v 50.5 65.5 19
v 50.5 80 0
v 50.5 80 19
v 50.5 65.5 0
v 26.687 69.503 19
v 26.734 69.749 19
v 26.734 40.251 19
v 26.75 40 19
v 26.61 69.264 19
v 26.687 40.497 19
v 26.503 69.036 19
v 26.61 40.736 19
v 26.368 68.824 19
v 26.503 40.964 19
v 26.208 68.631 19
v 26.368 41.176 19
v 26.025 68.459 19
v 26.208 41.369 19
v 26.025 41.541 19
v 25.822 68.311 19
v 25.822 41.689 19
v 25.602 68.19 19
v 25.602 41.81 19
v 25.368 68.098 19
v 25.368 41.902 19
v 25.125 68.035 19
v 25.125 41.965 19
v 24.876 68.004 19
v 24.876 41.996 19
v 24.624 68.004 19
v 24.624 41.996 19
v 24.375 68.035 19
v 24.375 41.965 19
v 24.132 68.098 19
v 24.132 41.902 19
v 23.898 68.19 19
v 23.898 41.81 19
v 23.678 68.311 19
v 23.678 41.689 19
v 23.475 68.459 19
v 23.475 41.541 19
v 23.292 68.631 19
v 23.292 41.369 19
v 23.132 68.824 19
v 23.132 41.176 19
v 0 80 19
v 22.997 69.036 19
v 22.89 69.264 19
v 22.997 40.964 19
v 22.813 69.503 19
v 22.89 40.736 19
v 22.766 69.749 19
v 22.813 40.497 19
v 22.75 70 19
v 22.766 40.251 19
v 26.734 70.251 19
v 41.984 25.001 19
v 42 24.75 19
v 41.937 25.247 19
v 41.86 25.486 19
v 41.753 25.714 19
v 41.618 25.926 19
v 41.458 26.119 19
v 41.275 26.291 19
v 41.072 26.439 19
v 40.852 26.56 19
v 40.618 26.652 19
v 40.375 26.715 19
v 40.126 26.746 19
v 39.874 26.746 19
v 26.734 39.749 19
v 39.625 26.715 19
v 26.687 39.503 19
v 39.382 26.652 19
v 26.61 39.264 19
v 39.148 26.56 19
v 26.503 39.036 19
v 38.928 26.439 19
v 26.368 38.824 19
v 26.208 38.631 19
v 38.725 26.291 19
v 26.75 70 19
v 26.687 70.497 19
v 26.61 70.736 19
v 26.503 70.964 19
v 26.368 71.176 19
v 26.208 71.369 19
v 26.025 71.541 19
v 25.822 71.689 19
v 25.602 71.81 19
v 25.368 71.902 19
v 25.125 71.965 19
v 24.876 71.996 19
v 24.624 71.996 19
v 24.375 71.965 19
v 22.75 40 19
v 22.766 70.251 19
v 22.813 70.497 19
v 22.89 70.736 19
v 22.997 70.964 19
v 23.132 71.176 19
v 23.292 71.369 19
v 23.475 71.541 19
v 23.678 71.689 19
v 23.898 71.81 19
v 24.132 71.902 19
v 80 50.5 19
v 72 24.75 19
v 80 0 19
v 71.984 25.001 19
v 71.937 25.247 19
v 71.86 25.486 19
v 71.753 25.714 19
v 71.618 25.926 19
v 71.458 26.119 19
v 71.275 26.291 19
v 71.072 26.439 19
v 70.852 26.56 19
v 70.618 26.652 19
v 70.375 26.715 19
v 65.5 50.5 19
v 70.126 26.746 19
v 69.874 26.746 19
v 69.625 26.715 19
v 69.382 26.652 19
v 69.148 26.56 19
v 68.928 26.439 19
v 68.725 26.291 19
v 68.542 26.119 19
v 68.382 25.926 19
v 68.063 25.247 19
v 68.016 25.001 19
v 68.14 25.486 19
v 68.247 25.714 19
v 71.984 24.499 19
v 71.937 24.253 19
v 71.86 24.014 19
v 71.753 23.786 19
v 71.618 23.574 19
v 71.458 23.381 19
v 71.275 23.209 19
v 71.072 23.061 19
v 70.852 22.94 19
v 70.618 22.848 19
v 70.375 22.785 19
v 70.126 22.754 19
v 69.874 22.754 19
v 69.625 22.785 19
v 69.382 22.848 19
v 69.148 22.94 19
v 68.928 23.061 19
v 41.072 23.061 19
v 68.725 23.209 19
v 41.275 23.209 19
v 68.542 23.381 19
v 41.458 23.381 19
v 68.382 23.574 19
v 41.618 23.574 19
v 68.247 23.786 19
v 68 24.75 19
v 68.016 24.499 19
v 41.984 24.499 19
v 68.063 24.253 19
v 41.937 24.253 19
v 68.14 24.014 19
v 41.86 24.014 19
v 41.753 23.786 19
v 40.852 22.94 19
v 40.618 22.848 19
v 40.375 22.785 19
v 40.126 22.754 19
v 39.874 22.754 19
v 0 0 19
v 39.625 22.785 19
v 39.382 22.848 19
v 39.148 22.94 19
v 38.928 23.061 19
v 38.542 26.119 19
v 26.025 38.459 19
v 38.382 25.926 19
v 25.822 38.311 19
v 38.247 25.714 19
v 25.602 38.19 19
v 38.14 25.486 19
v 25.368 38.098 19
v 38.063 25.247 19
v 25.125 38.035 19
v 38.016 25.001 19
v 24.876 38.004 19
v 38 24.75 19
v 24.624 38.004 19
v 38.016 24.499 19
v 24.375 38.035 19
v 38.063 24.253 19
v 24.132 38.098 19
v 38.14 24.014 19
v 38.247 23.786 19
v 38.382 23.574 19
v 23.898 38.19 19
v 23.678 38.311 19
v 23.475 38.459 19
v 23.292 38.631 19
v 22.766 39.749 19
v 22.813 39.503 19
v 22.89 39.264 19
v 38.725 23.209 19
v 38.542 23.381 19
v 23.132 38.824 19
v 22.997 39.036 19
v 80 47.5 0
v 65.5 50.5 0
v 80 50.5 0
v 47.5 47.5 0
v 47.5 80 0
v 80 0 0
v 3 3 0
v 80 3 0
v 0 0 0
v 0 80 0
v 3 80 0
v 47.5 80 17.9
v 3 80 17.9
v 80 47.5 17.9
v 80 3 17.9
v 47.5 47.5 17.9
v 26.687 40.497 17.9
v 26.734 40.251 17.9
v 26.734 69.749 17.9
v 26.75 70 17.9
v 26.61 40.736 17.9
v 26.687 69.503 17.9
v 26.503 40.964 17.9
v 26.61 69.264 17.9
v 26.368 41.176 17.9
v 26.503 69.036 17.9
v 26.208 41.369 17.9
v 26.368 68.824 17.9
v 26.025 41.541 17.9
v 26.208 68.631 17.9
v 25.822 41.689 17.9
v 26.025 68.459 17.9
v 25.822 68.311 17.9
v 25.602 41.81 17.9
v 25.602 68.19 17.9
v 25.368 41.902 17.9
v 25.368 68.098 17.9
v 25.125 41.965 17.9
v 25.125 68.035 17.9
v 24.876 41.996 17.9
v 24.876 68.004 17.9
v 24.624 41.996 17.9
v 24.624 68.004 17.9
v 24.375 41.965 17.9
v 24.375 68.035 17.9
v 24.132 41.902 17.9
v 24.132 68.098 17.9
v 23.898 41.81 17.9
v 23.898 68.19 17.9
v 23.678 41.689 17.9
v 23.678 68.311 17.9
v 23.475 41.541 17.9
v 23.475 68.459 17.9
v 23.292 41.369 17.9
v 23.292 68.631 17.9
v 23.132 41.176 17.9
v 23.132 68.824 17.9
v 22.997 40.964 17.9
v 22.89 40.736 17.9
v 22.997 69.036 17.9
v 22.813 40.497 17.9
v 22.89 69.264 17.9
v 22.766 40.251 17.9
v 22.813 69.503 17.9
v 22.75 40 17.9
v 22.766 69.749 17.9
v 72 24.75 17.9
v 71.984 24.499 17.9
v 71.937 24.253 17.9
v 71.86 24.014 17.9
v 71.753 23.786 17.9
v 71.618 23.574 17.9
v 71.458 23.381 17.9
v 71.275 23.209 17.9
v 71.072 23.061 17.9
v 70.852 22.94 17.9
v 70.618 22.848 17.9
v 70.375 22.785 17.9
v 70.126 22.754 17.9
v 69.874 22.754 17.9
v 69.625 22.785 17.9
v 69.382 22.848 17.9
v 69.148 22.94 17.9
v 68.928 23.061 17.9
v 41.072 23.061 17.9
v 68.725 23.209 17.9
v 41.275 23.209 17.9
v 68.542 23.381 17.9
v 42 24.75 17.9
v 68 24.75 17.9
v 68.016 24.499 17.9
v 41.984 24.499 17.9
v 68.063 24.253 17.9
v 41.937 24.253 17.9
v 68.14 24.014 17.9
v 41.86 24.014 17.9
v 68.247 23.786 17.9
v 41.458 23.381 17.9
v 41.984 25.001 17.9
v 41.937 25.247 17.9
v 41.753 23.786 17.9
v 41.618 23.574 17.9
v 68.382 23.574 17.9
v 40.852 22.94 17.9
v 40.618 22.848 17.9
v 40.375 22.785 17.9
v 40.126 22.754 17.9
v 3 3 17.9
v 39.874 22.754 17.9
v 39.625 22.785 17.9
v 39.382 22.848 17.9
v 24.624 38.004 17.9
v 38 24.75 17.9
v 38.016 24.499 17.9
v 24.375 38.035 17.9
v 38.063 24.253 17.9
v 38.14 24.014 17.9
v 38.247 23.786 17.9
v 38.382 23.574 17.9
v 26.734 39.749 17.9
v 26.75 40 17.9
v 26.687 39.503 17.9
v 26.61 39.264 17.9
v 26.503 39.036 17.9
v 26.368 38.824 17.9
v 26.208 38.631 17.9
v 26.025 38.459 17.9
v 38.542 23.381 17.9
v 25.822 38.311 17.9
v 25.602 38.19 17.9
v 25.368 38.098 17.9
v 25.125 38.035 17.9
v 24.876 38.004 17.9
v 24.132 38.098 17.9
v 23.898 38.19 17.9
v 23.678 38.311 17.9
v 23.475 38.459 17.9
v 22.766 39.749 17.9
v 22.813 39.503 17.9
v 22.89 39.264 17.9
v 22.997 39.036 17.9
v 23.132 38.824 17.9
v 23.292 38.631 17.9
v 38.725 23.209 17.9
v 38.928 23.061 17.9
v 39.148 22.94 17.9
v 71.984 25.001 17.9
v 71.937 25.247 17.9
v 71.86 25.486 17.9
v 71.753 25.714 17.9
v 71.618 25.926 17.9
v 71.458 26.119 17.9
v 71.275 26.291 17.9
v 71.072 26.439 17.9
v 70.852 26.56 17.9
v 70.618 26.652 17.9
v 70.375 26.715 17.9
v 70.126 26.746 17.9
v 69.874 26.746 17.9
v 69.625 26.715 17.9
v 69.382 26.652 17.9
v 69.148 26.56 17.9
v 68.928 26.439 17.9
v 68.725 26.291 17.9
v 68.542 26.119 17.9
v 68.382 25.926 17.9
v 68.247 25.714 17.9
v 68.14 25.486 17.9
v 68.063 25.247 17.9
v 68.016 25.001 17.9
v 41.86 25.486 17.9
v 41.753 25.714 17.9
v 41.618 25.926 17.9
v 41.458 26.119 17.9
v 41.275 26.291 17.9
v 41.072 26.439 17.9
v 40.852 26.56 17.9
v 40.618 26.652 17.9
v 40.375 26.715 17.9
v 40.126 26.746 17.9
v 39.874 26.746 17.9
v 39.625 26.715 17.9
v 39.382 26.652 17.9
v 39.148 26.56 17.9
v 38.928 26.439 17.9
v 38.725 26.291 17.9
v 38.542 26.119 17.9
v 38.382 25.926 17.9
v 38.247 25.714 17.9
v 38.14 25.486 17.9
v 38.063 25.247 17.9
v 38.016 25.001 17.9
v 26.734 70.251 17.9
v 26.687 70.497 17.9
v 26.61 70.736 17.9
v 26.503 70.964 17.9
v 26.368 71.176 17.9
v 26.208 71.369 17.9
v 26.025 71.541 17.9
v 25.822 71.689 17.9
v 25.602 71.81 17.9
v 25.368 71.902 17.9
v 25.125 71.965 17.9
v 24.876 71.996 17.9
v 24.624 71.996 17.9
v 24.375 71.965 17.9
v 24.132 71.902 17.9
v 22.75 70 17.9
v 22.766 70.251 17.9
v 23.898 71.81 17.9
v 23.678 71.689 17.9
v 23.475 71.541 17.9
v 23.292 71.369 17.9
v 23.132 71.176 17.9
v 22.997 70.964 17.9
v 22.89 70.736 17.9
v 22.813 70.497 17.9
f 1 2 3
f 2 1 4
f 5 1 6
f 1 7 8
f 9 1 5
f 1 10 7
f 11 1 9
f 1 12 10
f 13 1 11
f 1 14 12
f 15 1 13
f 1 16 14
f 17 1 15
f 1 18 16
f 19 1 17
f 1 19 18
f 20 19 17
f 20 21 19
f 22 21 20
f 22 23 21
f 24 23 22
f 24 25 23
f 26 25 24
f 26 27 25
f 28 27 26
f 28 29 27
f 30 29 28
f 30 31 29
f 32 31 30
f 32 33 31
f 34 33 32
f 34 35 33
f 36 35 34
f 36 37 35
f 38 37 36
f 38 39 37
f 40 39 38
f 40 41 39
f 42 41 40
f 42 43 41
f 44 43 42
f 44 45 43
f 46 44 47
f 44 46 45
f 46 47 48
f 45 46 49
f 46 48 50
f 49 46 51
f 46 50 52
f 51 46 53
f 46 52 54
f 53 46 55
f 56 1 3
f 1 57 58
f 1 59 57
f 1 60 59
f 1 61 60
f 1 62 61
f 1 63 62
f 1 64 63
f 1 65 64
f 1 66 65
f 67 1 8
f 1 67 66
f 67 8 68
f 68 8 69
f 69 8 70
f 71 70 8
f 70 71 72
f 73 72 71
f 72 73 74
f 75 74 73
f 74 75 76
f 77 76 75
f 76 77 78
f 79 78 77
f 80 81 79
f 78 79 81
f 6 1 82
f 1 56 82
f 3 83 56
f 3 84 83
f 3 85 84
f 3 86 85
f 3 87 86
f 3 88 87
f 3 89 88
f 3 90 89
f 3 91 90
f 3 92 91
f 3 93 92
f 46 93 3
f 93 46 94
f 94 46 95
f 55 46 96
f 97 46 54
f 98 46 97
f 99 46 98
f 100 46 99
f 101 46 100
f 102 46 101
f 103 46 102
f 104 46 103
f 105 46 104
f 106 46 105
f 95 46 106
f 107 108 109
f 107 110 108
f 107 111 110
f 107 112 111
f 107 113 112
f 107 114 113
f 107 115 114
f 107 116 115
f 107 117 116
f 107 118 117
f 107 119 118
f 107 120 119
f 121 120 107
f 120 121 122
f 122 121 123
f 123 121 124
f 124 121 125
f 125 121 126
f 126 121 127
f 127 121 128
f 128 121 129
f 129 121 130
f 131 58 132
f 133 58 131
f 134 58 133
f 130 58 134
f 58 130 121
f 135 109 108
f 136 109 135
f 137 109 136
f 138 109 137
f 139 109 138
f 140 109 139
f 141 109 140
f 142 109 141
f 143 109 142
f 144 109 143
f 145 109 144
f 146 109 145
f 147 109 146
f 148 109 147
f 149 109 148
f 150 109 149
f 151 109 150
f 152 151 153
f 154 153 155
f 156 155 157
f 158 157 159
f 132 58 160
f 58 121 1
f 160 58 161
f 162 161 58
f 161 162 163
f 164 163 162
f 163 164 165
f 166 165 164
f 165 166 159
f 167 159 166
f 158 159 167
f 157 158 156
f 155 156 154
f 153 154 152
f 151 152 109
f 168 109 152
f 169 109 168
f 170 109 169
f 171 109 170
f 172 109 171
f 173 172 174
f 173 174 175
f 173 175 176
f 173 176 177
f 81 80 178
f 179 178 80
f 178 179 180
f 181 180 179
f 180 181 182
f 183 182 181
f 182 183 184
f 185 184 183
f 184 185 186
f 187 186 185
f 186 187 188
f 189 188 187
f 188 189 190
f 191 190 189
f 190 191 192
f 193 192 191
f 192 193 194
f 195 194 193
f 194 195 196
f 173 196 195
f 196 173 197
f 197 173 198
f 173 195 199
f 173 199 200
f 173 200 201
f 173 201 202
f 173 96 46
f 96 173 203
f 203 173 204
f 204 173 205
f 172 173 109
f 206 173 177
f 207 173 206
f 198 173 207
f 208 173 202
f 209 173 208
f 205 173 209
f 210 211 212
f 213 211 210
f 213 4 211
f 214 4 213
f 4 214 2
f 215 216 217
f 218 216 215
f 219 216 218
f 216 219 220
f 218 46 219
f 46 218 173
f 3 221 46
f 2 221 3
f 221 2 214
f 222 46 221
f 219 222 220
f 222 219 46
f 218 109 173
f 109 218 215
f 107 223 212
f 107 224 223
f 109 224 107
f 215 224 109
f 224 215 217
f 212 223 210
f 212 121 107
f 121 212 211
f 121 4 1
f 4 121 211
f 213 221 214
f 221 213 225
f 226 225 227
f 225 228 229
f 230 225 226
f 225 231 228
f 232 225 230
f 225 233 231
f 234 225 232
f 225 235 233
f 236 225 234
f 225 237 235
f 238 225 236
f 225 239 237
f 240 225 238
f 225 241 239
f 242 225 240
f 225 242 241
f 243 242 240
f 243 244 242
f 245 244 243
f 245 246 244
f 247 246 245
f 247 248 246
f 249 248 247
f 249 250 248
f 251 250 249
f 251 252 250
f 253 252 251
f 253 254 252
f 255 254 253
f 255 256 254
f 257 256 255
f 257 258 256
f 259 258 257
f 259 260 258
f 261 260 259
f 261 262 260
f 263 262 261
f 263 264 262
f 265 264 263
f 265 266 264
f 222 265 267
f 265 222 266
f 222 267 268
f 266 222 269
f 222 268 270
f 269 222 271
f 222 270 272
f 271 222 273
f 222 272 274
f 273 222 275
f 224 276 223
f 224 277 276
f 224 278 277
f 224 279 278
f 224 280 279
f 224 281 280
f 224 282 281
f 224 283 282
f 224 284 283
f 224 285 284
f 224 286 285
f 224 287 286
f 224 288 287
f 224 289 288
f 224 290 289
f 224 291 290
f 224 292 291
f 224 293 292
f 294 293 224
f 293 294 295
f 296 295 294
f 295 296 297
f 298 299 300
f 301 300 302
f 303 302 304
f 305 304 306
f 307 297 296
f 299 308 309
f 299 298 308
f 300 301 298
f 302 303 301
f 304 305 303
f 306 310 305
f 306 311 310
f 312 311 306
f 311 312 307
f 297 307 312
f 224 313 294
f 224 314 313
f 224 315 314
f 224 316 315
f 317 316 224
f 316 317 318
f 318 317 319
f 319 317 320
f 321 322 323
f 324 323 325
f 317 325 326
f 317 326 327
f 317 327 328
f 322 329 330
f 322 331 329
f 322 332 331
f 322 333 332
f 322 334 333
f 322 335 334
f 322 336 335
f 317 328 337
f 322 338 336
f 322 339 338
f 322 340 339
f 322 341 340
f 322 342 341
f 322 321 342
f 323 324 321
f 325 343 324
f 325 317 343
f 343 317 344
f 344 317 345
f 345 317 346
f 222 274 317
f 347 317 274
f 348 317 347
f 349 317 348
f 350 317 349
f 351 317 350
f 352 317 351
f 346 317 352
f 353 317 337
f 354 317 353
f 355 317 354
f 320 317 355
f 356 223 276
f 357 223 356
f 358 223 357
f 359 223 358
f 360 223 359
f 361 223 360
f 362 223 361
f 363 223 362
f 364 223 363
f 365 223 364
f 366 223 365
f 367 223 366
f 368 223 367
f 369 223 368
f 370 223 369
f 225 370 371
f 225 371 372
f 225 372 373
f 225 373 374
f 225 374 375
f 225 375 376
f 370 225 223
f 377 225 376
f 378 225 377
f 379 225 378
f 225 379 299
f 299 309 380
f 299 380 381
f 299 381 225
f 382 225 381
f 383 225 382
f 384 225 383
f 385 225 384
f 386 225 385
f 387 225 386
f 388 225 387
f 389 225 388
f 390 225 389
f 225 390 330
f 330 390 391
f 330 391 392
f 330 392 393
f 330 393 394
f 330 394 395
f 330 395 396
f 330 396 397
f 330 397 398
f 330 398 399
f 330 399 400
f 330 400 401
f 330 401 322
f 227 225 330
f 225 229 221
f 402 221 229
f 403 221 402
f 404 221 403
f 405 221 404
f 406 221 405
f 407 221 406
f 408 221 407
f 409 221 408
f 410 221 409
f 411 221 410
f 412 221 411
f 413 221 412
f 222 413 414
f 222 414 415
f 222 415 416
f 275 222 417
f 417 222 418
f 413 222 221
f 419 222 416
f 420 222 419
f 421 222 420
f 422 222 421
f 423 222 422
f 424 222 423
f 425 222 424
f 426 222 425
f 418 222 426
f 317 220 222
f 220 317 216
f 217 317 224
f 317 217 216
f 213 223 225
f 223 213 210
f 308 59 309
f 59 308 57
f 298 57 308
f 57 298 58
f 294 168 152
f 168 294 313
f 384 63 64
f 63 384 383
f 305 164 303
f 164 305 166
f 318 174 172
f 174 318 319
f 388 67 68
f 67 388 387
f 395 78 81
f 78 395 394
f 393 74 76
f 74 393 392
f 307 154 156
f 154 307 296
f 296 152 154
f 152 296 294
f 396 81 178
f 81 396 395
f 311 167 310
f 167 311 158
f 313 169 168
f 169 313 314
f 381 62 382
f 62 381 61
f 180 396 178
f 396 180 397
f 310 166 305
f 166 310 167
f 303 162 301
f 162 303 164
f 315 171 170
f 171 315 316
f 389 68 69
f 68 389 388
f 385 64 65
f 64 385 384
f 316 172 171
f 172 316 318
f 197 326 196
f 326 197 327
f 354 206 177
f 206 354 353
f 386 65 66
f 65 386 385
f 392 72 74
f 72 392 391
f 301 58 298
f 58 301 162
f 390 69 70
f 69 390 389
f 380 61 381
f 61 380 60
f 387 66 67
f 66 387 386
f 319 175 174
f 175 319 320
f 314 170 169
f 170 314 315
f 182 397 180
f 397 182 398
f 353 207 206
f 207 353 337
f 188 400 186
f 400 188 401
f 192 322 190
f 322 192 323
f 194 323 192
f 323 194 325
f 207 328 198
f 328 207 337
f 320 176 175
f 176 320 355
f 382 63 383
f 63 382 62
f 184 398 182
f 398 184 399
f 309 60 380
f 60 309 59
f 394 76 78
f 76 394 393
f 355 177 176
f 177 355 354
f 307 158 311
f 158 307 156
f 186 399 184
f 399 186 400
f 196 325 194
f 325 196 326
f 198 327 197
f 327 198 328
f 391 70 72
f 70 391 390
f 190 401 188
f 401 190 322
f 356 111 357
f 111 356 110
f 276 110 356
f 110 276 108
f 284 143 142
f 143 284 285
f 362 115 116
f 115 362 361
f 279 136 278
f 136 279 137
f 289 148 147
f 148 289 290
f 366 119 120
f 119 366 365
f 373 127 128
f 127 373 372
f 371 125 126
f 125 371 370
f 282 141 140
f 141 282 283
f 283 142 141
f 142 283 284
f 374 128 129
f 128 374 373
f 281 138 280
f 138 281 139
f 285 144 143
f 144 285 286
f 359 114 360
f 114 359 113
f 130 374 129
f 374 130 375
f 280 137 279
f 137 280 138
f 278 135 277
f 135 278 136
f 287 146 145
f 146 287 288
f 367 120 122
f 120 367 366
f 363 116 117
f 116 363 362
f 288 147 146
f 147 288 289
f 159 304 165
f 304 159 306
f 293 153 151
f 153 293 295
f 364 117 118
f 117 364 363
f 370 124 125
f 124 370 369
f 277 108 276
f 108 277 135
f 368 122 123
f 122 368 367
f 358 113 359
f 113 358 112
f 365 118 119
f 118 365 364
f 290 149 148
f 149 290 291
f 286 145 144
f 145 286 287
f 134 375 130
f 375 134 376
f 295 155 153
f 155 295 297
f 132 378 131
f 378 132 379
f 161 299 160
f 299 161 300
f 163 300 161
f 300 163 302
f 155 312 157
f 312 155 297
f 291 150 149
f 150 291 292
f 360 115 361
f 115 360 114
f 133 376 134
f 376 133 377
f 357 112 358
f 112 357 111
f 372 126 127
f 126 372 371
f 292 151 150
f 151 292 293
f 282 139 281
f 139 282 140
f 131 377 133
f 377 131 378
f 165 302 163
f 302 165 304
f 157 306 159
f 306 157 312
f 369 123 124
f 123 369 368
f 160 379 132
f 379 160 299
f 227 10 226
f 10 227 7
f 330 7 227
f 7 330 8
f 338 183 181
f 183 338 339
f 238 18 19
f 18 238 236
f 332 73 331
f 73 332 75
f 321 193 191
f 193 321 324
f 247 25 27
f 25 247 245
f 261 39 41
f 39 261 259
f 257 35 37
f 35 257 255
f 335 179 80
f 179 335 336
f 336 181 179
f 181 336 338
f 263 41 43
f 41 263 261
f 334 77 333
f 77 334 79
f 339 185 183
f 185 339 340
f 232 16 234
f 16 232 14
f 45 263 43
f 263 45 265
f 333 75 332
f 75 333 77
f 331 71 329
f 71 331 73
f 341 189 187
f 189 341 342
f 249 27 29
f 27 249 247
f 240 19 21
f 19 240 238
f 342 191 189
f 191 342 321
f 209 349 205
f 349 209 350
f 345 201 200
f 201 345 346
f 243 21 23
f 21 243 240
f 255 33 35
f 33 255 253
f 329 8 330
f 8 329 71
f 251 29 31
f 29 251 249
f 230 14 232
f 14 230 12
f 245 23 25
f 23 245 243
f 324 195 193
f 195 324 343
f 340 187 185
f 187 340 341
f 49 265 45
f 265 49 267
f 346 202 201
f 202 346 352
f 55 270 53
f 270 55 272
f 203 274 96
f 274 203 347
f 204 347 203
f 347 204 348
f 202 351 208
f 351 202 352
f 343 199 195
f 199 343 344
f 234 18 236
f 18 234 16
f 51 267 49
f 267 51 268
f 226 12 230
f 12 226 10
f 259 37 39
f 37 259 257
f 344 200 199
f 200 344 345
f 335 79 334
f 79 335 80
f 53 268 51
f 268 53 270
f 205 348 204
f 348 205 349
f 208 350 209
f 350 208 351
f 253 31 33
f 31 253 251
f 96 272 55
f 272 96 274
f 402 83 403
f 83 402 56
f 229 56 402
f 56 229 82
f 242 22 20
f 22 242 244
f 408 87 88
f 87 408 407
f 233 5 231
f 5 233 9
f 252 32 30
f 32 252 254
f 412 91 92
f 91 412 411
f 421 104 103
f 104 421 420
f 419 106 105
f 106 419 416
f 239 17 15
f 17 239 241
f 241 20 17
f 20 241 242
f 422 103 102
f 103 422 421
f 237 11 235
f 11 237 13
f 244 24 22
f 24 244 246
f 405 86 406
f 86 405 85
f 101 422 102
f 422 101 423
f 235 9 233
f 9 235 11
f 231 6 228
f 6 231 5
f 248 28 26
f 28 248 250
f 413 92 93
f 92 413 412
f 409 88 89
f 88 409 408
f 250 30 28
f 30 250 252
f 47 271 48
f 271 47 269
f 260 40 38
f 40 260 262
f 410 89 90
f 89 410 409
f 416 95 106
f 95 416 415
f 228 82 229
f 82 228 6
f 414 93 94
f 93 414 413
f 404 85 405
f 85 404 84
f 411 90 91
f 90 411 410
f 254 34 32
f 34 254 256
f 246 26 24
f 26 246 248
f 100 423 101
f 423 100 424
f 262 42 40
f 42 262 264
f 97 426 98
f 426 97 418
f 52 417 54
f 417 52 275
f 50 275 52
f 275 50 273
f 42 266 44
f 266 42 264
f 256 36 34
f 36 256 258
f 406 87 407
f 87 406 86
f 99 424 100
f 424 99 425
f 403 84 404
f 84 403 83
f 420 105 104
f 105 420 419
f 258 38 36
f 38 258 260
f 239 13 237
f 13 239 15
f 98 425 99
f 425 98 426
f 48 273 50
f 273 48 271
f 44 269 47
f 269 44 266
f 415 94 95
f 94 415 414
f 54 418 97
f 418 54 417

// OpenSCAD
$fn = 50;

module wood() {
  translate([3, 3, -0.1])
    color("green") {
      cube([44.5, 200, 18]);
      cube([200, 44.5, 18]);
    }  
}

module clamp() {
  cube([50.5, 80, 19]);
  cube([80, 50.5, 19]);

  l = 15;
  l1 = sqrt( l * l + l * l);

  translate([50.5 + l, 50.5, 0])
    rotate([0, 0, 135])
      cube([l1, l1, 19]);
}


difference() {
  clamp();
  wood();
  
  translate([0, 0, -5]) {
    translate([0, 0, 0]) {
      translate([40, 24.75, 0])
        cylinder(50, 2, 2);
      
      translate([70, 24.75, 0])
        cylinder(50, 2, 2);
      
      translate([24.75, 40, 0])
        cylinder(50, 2, 2);
      
      translate([24.75, 70, 0])
        cylinder(50, 2, 2);
    }
  }
}
